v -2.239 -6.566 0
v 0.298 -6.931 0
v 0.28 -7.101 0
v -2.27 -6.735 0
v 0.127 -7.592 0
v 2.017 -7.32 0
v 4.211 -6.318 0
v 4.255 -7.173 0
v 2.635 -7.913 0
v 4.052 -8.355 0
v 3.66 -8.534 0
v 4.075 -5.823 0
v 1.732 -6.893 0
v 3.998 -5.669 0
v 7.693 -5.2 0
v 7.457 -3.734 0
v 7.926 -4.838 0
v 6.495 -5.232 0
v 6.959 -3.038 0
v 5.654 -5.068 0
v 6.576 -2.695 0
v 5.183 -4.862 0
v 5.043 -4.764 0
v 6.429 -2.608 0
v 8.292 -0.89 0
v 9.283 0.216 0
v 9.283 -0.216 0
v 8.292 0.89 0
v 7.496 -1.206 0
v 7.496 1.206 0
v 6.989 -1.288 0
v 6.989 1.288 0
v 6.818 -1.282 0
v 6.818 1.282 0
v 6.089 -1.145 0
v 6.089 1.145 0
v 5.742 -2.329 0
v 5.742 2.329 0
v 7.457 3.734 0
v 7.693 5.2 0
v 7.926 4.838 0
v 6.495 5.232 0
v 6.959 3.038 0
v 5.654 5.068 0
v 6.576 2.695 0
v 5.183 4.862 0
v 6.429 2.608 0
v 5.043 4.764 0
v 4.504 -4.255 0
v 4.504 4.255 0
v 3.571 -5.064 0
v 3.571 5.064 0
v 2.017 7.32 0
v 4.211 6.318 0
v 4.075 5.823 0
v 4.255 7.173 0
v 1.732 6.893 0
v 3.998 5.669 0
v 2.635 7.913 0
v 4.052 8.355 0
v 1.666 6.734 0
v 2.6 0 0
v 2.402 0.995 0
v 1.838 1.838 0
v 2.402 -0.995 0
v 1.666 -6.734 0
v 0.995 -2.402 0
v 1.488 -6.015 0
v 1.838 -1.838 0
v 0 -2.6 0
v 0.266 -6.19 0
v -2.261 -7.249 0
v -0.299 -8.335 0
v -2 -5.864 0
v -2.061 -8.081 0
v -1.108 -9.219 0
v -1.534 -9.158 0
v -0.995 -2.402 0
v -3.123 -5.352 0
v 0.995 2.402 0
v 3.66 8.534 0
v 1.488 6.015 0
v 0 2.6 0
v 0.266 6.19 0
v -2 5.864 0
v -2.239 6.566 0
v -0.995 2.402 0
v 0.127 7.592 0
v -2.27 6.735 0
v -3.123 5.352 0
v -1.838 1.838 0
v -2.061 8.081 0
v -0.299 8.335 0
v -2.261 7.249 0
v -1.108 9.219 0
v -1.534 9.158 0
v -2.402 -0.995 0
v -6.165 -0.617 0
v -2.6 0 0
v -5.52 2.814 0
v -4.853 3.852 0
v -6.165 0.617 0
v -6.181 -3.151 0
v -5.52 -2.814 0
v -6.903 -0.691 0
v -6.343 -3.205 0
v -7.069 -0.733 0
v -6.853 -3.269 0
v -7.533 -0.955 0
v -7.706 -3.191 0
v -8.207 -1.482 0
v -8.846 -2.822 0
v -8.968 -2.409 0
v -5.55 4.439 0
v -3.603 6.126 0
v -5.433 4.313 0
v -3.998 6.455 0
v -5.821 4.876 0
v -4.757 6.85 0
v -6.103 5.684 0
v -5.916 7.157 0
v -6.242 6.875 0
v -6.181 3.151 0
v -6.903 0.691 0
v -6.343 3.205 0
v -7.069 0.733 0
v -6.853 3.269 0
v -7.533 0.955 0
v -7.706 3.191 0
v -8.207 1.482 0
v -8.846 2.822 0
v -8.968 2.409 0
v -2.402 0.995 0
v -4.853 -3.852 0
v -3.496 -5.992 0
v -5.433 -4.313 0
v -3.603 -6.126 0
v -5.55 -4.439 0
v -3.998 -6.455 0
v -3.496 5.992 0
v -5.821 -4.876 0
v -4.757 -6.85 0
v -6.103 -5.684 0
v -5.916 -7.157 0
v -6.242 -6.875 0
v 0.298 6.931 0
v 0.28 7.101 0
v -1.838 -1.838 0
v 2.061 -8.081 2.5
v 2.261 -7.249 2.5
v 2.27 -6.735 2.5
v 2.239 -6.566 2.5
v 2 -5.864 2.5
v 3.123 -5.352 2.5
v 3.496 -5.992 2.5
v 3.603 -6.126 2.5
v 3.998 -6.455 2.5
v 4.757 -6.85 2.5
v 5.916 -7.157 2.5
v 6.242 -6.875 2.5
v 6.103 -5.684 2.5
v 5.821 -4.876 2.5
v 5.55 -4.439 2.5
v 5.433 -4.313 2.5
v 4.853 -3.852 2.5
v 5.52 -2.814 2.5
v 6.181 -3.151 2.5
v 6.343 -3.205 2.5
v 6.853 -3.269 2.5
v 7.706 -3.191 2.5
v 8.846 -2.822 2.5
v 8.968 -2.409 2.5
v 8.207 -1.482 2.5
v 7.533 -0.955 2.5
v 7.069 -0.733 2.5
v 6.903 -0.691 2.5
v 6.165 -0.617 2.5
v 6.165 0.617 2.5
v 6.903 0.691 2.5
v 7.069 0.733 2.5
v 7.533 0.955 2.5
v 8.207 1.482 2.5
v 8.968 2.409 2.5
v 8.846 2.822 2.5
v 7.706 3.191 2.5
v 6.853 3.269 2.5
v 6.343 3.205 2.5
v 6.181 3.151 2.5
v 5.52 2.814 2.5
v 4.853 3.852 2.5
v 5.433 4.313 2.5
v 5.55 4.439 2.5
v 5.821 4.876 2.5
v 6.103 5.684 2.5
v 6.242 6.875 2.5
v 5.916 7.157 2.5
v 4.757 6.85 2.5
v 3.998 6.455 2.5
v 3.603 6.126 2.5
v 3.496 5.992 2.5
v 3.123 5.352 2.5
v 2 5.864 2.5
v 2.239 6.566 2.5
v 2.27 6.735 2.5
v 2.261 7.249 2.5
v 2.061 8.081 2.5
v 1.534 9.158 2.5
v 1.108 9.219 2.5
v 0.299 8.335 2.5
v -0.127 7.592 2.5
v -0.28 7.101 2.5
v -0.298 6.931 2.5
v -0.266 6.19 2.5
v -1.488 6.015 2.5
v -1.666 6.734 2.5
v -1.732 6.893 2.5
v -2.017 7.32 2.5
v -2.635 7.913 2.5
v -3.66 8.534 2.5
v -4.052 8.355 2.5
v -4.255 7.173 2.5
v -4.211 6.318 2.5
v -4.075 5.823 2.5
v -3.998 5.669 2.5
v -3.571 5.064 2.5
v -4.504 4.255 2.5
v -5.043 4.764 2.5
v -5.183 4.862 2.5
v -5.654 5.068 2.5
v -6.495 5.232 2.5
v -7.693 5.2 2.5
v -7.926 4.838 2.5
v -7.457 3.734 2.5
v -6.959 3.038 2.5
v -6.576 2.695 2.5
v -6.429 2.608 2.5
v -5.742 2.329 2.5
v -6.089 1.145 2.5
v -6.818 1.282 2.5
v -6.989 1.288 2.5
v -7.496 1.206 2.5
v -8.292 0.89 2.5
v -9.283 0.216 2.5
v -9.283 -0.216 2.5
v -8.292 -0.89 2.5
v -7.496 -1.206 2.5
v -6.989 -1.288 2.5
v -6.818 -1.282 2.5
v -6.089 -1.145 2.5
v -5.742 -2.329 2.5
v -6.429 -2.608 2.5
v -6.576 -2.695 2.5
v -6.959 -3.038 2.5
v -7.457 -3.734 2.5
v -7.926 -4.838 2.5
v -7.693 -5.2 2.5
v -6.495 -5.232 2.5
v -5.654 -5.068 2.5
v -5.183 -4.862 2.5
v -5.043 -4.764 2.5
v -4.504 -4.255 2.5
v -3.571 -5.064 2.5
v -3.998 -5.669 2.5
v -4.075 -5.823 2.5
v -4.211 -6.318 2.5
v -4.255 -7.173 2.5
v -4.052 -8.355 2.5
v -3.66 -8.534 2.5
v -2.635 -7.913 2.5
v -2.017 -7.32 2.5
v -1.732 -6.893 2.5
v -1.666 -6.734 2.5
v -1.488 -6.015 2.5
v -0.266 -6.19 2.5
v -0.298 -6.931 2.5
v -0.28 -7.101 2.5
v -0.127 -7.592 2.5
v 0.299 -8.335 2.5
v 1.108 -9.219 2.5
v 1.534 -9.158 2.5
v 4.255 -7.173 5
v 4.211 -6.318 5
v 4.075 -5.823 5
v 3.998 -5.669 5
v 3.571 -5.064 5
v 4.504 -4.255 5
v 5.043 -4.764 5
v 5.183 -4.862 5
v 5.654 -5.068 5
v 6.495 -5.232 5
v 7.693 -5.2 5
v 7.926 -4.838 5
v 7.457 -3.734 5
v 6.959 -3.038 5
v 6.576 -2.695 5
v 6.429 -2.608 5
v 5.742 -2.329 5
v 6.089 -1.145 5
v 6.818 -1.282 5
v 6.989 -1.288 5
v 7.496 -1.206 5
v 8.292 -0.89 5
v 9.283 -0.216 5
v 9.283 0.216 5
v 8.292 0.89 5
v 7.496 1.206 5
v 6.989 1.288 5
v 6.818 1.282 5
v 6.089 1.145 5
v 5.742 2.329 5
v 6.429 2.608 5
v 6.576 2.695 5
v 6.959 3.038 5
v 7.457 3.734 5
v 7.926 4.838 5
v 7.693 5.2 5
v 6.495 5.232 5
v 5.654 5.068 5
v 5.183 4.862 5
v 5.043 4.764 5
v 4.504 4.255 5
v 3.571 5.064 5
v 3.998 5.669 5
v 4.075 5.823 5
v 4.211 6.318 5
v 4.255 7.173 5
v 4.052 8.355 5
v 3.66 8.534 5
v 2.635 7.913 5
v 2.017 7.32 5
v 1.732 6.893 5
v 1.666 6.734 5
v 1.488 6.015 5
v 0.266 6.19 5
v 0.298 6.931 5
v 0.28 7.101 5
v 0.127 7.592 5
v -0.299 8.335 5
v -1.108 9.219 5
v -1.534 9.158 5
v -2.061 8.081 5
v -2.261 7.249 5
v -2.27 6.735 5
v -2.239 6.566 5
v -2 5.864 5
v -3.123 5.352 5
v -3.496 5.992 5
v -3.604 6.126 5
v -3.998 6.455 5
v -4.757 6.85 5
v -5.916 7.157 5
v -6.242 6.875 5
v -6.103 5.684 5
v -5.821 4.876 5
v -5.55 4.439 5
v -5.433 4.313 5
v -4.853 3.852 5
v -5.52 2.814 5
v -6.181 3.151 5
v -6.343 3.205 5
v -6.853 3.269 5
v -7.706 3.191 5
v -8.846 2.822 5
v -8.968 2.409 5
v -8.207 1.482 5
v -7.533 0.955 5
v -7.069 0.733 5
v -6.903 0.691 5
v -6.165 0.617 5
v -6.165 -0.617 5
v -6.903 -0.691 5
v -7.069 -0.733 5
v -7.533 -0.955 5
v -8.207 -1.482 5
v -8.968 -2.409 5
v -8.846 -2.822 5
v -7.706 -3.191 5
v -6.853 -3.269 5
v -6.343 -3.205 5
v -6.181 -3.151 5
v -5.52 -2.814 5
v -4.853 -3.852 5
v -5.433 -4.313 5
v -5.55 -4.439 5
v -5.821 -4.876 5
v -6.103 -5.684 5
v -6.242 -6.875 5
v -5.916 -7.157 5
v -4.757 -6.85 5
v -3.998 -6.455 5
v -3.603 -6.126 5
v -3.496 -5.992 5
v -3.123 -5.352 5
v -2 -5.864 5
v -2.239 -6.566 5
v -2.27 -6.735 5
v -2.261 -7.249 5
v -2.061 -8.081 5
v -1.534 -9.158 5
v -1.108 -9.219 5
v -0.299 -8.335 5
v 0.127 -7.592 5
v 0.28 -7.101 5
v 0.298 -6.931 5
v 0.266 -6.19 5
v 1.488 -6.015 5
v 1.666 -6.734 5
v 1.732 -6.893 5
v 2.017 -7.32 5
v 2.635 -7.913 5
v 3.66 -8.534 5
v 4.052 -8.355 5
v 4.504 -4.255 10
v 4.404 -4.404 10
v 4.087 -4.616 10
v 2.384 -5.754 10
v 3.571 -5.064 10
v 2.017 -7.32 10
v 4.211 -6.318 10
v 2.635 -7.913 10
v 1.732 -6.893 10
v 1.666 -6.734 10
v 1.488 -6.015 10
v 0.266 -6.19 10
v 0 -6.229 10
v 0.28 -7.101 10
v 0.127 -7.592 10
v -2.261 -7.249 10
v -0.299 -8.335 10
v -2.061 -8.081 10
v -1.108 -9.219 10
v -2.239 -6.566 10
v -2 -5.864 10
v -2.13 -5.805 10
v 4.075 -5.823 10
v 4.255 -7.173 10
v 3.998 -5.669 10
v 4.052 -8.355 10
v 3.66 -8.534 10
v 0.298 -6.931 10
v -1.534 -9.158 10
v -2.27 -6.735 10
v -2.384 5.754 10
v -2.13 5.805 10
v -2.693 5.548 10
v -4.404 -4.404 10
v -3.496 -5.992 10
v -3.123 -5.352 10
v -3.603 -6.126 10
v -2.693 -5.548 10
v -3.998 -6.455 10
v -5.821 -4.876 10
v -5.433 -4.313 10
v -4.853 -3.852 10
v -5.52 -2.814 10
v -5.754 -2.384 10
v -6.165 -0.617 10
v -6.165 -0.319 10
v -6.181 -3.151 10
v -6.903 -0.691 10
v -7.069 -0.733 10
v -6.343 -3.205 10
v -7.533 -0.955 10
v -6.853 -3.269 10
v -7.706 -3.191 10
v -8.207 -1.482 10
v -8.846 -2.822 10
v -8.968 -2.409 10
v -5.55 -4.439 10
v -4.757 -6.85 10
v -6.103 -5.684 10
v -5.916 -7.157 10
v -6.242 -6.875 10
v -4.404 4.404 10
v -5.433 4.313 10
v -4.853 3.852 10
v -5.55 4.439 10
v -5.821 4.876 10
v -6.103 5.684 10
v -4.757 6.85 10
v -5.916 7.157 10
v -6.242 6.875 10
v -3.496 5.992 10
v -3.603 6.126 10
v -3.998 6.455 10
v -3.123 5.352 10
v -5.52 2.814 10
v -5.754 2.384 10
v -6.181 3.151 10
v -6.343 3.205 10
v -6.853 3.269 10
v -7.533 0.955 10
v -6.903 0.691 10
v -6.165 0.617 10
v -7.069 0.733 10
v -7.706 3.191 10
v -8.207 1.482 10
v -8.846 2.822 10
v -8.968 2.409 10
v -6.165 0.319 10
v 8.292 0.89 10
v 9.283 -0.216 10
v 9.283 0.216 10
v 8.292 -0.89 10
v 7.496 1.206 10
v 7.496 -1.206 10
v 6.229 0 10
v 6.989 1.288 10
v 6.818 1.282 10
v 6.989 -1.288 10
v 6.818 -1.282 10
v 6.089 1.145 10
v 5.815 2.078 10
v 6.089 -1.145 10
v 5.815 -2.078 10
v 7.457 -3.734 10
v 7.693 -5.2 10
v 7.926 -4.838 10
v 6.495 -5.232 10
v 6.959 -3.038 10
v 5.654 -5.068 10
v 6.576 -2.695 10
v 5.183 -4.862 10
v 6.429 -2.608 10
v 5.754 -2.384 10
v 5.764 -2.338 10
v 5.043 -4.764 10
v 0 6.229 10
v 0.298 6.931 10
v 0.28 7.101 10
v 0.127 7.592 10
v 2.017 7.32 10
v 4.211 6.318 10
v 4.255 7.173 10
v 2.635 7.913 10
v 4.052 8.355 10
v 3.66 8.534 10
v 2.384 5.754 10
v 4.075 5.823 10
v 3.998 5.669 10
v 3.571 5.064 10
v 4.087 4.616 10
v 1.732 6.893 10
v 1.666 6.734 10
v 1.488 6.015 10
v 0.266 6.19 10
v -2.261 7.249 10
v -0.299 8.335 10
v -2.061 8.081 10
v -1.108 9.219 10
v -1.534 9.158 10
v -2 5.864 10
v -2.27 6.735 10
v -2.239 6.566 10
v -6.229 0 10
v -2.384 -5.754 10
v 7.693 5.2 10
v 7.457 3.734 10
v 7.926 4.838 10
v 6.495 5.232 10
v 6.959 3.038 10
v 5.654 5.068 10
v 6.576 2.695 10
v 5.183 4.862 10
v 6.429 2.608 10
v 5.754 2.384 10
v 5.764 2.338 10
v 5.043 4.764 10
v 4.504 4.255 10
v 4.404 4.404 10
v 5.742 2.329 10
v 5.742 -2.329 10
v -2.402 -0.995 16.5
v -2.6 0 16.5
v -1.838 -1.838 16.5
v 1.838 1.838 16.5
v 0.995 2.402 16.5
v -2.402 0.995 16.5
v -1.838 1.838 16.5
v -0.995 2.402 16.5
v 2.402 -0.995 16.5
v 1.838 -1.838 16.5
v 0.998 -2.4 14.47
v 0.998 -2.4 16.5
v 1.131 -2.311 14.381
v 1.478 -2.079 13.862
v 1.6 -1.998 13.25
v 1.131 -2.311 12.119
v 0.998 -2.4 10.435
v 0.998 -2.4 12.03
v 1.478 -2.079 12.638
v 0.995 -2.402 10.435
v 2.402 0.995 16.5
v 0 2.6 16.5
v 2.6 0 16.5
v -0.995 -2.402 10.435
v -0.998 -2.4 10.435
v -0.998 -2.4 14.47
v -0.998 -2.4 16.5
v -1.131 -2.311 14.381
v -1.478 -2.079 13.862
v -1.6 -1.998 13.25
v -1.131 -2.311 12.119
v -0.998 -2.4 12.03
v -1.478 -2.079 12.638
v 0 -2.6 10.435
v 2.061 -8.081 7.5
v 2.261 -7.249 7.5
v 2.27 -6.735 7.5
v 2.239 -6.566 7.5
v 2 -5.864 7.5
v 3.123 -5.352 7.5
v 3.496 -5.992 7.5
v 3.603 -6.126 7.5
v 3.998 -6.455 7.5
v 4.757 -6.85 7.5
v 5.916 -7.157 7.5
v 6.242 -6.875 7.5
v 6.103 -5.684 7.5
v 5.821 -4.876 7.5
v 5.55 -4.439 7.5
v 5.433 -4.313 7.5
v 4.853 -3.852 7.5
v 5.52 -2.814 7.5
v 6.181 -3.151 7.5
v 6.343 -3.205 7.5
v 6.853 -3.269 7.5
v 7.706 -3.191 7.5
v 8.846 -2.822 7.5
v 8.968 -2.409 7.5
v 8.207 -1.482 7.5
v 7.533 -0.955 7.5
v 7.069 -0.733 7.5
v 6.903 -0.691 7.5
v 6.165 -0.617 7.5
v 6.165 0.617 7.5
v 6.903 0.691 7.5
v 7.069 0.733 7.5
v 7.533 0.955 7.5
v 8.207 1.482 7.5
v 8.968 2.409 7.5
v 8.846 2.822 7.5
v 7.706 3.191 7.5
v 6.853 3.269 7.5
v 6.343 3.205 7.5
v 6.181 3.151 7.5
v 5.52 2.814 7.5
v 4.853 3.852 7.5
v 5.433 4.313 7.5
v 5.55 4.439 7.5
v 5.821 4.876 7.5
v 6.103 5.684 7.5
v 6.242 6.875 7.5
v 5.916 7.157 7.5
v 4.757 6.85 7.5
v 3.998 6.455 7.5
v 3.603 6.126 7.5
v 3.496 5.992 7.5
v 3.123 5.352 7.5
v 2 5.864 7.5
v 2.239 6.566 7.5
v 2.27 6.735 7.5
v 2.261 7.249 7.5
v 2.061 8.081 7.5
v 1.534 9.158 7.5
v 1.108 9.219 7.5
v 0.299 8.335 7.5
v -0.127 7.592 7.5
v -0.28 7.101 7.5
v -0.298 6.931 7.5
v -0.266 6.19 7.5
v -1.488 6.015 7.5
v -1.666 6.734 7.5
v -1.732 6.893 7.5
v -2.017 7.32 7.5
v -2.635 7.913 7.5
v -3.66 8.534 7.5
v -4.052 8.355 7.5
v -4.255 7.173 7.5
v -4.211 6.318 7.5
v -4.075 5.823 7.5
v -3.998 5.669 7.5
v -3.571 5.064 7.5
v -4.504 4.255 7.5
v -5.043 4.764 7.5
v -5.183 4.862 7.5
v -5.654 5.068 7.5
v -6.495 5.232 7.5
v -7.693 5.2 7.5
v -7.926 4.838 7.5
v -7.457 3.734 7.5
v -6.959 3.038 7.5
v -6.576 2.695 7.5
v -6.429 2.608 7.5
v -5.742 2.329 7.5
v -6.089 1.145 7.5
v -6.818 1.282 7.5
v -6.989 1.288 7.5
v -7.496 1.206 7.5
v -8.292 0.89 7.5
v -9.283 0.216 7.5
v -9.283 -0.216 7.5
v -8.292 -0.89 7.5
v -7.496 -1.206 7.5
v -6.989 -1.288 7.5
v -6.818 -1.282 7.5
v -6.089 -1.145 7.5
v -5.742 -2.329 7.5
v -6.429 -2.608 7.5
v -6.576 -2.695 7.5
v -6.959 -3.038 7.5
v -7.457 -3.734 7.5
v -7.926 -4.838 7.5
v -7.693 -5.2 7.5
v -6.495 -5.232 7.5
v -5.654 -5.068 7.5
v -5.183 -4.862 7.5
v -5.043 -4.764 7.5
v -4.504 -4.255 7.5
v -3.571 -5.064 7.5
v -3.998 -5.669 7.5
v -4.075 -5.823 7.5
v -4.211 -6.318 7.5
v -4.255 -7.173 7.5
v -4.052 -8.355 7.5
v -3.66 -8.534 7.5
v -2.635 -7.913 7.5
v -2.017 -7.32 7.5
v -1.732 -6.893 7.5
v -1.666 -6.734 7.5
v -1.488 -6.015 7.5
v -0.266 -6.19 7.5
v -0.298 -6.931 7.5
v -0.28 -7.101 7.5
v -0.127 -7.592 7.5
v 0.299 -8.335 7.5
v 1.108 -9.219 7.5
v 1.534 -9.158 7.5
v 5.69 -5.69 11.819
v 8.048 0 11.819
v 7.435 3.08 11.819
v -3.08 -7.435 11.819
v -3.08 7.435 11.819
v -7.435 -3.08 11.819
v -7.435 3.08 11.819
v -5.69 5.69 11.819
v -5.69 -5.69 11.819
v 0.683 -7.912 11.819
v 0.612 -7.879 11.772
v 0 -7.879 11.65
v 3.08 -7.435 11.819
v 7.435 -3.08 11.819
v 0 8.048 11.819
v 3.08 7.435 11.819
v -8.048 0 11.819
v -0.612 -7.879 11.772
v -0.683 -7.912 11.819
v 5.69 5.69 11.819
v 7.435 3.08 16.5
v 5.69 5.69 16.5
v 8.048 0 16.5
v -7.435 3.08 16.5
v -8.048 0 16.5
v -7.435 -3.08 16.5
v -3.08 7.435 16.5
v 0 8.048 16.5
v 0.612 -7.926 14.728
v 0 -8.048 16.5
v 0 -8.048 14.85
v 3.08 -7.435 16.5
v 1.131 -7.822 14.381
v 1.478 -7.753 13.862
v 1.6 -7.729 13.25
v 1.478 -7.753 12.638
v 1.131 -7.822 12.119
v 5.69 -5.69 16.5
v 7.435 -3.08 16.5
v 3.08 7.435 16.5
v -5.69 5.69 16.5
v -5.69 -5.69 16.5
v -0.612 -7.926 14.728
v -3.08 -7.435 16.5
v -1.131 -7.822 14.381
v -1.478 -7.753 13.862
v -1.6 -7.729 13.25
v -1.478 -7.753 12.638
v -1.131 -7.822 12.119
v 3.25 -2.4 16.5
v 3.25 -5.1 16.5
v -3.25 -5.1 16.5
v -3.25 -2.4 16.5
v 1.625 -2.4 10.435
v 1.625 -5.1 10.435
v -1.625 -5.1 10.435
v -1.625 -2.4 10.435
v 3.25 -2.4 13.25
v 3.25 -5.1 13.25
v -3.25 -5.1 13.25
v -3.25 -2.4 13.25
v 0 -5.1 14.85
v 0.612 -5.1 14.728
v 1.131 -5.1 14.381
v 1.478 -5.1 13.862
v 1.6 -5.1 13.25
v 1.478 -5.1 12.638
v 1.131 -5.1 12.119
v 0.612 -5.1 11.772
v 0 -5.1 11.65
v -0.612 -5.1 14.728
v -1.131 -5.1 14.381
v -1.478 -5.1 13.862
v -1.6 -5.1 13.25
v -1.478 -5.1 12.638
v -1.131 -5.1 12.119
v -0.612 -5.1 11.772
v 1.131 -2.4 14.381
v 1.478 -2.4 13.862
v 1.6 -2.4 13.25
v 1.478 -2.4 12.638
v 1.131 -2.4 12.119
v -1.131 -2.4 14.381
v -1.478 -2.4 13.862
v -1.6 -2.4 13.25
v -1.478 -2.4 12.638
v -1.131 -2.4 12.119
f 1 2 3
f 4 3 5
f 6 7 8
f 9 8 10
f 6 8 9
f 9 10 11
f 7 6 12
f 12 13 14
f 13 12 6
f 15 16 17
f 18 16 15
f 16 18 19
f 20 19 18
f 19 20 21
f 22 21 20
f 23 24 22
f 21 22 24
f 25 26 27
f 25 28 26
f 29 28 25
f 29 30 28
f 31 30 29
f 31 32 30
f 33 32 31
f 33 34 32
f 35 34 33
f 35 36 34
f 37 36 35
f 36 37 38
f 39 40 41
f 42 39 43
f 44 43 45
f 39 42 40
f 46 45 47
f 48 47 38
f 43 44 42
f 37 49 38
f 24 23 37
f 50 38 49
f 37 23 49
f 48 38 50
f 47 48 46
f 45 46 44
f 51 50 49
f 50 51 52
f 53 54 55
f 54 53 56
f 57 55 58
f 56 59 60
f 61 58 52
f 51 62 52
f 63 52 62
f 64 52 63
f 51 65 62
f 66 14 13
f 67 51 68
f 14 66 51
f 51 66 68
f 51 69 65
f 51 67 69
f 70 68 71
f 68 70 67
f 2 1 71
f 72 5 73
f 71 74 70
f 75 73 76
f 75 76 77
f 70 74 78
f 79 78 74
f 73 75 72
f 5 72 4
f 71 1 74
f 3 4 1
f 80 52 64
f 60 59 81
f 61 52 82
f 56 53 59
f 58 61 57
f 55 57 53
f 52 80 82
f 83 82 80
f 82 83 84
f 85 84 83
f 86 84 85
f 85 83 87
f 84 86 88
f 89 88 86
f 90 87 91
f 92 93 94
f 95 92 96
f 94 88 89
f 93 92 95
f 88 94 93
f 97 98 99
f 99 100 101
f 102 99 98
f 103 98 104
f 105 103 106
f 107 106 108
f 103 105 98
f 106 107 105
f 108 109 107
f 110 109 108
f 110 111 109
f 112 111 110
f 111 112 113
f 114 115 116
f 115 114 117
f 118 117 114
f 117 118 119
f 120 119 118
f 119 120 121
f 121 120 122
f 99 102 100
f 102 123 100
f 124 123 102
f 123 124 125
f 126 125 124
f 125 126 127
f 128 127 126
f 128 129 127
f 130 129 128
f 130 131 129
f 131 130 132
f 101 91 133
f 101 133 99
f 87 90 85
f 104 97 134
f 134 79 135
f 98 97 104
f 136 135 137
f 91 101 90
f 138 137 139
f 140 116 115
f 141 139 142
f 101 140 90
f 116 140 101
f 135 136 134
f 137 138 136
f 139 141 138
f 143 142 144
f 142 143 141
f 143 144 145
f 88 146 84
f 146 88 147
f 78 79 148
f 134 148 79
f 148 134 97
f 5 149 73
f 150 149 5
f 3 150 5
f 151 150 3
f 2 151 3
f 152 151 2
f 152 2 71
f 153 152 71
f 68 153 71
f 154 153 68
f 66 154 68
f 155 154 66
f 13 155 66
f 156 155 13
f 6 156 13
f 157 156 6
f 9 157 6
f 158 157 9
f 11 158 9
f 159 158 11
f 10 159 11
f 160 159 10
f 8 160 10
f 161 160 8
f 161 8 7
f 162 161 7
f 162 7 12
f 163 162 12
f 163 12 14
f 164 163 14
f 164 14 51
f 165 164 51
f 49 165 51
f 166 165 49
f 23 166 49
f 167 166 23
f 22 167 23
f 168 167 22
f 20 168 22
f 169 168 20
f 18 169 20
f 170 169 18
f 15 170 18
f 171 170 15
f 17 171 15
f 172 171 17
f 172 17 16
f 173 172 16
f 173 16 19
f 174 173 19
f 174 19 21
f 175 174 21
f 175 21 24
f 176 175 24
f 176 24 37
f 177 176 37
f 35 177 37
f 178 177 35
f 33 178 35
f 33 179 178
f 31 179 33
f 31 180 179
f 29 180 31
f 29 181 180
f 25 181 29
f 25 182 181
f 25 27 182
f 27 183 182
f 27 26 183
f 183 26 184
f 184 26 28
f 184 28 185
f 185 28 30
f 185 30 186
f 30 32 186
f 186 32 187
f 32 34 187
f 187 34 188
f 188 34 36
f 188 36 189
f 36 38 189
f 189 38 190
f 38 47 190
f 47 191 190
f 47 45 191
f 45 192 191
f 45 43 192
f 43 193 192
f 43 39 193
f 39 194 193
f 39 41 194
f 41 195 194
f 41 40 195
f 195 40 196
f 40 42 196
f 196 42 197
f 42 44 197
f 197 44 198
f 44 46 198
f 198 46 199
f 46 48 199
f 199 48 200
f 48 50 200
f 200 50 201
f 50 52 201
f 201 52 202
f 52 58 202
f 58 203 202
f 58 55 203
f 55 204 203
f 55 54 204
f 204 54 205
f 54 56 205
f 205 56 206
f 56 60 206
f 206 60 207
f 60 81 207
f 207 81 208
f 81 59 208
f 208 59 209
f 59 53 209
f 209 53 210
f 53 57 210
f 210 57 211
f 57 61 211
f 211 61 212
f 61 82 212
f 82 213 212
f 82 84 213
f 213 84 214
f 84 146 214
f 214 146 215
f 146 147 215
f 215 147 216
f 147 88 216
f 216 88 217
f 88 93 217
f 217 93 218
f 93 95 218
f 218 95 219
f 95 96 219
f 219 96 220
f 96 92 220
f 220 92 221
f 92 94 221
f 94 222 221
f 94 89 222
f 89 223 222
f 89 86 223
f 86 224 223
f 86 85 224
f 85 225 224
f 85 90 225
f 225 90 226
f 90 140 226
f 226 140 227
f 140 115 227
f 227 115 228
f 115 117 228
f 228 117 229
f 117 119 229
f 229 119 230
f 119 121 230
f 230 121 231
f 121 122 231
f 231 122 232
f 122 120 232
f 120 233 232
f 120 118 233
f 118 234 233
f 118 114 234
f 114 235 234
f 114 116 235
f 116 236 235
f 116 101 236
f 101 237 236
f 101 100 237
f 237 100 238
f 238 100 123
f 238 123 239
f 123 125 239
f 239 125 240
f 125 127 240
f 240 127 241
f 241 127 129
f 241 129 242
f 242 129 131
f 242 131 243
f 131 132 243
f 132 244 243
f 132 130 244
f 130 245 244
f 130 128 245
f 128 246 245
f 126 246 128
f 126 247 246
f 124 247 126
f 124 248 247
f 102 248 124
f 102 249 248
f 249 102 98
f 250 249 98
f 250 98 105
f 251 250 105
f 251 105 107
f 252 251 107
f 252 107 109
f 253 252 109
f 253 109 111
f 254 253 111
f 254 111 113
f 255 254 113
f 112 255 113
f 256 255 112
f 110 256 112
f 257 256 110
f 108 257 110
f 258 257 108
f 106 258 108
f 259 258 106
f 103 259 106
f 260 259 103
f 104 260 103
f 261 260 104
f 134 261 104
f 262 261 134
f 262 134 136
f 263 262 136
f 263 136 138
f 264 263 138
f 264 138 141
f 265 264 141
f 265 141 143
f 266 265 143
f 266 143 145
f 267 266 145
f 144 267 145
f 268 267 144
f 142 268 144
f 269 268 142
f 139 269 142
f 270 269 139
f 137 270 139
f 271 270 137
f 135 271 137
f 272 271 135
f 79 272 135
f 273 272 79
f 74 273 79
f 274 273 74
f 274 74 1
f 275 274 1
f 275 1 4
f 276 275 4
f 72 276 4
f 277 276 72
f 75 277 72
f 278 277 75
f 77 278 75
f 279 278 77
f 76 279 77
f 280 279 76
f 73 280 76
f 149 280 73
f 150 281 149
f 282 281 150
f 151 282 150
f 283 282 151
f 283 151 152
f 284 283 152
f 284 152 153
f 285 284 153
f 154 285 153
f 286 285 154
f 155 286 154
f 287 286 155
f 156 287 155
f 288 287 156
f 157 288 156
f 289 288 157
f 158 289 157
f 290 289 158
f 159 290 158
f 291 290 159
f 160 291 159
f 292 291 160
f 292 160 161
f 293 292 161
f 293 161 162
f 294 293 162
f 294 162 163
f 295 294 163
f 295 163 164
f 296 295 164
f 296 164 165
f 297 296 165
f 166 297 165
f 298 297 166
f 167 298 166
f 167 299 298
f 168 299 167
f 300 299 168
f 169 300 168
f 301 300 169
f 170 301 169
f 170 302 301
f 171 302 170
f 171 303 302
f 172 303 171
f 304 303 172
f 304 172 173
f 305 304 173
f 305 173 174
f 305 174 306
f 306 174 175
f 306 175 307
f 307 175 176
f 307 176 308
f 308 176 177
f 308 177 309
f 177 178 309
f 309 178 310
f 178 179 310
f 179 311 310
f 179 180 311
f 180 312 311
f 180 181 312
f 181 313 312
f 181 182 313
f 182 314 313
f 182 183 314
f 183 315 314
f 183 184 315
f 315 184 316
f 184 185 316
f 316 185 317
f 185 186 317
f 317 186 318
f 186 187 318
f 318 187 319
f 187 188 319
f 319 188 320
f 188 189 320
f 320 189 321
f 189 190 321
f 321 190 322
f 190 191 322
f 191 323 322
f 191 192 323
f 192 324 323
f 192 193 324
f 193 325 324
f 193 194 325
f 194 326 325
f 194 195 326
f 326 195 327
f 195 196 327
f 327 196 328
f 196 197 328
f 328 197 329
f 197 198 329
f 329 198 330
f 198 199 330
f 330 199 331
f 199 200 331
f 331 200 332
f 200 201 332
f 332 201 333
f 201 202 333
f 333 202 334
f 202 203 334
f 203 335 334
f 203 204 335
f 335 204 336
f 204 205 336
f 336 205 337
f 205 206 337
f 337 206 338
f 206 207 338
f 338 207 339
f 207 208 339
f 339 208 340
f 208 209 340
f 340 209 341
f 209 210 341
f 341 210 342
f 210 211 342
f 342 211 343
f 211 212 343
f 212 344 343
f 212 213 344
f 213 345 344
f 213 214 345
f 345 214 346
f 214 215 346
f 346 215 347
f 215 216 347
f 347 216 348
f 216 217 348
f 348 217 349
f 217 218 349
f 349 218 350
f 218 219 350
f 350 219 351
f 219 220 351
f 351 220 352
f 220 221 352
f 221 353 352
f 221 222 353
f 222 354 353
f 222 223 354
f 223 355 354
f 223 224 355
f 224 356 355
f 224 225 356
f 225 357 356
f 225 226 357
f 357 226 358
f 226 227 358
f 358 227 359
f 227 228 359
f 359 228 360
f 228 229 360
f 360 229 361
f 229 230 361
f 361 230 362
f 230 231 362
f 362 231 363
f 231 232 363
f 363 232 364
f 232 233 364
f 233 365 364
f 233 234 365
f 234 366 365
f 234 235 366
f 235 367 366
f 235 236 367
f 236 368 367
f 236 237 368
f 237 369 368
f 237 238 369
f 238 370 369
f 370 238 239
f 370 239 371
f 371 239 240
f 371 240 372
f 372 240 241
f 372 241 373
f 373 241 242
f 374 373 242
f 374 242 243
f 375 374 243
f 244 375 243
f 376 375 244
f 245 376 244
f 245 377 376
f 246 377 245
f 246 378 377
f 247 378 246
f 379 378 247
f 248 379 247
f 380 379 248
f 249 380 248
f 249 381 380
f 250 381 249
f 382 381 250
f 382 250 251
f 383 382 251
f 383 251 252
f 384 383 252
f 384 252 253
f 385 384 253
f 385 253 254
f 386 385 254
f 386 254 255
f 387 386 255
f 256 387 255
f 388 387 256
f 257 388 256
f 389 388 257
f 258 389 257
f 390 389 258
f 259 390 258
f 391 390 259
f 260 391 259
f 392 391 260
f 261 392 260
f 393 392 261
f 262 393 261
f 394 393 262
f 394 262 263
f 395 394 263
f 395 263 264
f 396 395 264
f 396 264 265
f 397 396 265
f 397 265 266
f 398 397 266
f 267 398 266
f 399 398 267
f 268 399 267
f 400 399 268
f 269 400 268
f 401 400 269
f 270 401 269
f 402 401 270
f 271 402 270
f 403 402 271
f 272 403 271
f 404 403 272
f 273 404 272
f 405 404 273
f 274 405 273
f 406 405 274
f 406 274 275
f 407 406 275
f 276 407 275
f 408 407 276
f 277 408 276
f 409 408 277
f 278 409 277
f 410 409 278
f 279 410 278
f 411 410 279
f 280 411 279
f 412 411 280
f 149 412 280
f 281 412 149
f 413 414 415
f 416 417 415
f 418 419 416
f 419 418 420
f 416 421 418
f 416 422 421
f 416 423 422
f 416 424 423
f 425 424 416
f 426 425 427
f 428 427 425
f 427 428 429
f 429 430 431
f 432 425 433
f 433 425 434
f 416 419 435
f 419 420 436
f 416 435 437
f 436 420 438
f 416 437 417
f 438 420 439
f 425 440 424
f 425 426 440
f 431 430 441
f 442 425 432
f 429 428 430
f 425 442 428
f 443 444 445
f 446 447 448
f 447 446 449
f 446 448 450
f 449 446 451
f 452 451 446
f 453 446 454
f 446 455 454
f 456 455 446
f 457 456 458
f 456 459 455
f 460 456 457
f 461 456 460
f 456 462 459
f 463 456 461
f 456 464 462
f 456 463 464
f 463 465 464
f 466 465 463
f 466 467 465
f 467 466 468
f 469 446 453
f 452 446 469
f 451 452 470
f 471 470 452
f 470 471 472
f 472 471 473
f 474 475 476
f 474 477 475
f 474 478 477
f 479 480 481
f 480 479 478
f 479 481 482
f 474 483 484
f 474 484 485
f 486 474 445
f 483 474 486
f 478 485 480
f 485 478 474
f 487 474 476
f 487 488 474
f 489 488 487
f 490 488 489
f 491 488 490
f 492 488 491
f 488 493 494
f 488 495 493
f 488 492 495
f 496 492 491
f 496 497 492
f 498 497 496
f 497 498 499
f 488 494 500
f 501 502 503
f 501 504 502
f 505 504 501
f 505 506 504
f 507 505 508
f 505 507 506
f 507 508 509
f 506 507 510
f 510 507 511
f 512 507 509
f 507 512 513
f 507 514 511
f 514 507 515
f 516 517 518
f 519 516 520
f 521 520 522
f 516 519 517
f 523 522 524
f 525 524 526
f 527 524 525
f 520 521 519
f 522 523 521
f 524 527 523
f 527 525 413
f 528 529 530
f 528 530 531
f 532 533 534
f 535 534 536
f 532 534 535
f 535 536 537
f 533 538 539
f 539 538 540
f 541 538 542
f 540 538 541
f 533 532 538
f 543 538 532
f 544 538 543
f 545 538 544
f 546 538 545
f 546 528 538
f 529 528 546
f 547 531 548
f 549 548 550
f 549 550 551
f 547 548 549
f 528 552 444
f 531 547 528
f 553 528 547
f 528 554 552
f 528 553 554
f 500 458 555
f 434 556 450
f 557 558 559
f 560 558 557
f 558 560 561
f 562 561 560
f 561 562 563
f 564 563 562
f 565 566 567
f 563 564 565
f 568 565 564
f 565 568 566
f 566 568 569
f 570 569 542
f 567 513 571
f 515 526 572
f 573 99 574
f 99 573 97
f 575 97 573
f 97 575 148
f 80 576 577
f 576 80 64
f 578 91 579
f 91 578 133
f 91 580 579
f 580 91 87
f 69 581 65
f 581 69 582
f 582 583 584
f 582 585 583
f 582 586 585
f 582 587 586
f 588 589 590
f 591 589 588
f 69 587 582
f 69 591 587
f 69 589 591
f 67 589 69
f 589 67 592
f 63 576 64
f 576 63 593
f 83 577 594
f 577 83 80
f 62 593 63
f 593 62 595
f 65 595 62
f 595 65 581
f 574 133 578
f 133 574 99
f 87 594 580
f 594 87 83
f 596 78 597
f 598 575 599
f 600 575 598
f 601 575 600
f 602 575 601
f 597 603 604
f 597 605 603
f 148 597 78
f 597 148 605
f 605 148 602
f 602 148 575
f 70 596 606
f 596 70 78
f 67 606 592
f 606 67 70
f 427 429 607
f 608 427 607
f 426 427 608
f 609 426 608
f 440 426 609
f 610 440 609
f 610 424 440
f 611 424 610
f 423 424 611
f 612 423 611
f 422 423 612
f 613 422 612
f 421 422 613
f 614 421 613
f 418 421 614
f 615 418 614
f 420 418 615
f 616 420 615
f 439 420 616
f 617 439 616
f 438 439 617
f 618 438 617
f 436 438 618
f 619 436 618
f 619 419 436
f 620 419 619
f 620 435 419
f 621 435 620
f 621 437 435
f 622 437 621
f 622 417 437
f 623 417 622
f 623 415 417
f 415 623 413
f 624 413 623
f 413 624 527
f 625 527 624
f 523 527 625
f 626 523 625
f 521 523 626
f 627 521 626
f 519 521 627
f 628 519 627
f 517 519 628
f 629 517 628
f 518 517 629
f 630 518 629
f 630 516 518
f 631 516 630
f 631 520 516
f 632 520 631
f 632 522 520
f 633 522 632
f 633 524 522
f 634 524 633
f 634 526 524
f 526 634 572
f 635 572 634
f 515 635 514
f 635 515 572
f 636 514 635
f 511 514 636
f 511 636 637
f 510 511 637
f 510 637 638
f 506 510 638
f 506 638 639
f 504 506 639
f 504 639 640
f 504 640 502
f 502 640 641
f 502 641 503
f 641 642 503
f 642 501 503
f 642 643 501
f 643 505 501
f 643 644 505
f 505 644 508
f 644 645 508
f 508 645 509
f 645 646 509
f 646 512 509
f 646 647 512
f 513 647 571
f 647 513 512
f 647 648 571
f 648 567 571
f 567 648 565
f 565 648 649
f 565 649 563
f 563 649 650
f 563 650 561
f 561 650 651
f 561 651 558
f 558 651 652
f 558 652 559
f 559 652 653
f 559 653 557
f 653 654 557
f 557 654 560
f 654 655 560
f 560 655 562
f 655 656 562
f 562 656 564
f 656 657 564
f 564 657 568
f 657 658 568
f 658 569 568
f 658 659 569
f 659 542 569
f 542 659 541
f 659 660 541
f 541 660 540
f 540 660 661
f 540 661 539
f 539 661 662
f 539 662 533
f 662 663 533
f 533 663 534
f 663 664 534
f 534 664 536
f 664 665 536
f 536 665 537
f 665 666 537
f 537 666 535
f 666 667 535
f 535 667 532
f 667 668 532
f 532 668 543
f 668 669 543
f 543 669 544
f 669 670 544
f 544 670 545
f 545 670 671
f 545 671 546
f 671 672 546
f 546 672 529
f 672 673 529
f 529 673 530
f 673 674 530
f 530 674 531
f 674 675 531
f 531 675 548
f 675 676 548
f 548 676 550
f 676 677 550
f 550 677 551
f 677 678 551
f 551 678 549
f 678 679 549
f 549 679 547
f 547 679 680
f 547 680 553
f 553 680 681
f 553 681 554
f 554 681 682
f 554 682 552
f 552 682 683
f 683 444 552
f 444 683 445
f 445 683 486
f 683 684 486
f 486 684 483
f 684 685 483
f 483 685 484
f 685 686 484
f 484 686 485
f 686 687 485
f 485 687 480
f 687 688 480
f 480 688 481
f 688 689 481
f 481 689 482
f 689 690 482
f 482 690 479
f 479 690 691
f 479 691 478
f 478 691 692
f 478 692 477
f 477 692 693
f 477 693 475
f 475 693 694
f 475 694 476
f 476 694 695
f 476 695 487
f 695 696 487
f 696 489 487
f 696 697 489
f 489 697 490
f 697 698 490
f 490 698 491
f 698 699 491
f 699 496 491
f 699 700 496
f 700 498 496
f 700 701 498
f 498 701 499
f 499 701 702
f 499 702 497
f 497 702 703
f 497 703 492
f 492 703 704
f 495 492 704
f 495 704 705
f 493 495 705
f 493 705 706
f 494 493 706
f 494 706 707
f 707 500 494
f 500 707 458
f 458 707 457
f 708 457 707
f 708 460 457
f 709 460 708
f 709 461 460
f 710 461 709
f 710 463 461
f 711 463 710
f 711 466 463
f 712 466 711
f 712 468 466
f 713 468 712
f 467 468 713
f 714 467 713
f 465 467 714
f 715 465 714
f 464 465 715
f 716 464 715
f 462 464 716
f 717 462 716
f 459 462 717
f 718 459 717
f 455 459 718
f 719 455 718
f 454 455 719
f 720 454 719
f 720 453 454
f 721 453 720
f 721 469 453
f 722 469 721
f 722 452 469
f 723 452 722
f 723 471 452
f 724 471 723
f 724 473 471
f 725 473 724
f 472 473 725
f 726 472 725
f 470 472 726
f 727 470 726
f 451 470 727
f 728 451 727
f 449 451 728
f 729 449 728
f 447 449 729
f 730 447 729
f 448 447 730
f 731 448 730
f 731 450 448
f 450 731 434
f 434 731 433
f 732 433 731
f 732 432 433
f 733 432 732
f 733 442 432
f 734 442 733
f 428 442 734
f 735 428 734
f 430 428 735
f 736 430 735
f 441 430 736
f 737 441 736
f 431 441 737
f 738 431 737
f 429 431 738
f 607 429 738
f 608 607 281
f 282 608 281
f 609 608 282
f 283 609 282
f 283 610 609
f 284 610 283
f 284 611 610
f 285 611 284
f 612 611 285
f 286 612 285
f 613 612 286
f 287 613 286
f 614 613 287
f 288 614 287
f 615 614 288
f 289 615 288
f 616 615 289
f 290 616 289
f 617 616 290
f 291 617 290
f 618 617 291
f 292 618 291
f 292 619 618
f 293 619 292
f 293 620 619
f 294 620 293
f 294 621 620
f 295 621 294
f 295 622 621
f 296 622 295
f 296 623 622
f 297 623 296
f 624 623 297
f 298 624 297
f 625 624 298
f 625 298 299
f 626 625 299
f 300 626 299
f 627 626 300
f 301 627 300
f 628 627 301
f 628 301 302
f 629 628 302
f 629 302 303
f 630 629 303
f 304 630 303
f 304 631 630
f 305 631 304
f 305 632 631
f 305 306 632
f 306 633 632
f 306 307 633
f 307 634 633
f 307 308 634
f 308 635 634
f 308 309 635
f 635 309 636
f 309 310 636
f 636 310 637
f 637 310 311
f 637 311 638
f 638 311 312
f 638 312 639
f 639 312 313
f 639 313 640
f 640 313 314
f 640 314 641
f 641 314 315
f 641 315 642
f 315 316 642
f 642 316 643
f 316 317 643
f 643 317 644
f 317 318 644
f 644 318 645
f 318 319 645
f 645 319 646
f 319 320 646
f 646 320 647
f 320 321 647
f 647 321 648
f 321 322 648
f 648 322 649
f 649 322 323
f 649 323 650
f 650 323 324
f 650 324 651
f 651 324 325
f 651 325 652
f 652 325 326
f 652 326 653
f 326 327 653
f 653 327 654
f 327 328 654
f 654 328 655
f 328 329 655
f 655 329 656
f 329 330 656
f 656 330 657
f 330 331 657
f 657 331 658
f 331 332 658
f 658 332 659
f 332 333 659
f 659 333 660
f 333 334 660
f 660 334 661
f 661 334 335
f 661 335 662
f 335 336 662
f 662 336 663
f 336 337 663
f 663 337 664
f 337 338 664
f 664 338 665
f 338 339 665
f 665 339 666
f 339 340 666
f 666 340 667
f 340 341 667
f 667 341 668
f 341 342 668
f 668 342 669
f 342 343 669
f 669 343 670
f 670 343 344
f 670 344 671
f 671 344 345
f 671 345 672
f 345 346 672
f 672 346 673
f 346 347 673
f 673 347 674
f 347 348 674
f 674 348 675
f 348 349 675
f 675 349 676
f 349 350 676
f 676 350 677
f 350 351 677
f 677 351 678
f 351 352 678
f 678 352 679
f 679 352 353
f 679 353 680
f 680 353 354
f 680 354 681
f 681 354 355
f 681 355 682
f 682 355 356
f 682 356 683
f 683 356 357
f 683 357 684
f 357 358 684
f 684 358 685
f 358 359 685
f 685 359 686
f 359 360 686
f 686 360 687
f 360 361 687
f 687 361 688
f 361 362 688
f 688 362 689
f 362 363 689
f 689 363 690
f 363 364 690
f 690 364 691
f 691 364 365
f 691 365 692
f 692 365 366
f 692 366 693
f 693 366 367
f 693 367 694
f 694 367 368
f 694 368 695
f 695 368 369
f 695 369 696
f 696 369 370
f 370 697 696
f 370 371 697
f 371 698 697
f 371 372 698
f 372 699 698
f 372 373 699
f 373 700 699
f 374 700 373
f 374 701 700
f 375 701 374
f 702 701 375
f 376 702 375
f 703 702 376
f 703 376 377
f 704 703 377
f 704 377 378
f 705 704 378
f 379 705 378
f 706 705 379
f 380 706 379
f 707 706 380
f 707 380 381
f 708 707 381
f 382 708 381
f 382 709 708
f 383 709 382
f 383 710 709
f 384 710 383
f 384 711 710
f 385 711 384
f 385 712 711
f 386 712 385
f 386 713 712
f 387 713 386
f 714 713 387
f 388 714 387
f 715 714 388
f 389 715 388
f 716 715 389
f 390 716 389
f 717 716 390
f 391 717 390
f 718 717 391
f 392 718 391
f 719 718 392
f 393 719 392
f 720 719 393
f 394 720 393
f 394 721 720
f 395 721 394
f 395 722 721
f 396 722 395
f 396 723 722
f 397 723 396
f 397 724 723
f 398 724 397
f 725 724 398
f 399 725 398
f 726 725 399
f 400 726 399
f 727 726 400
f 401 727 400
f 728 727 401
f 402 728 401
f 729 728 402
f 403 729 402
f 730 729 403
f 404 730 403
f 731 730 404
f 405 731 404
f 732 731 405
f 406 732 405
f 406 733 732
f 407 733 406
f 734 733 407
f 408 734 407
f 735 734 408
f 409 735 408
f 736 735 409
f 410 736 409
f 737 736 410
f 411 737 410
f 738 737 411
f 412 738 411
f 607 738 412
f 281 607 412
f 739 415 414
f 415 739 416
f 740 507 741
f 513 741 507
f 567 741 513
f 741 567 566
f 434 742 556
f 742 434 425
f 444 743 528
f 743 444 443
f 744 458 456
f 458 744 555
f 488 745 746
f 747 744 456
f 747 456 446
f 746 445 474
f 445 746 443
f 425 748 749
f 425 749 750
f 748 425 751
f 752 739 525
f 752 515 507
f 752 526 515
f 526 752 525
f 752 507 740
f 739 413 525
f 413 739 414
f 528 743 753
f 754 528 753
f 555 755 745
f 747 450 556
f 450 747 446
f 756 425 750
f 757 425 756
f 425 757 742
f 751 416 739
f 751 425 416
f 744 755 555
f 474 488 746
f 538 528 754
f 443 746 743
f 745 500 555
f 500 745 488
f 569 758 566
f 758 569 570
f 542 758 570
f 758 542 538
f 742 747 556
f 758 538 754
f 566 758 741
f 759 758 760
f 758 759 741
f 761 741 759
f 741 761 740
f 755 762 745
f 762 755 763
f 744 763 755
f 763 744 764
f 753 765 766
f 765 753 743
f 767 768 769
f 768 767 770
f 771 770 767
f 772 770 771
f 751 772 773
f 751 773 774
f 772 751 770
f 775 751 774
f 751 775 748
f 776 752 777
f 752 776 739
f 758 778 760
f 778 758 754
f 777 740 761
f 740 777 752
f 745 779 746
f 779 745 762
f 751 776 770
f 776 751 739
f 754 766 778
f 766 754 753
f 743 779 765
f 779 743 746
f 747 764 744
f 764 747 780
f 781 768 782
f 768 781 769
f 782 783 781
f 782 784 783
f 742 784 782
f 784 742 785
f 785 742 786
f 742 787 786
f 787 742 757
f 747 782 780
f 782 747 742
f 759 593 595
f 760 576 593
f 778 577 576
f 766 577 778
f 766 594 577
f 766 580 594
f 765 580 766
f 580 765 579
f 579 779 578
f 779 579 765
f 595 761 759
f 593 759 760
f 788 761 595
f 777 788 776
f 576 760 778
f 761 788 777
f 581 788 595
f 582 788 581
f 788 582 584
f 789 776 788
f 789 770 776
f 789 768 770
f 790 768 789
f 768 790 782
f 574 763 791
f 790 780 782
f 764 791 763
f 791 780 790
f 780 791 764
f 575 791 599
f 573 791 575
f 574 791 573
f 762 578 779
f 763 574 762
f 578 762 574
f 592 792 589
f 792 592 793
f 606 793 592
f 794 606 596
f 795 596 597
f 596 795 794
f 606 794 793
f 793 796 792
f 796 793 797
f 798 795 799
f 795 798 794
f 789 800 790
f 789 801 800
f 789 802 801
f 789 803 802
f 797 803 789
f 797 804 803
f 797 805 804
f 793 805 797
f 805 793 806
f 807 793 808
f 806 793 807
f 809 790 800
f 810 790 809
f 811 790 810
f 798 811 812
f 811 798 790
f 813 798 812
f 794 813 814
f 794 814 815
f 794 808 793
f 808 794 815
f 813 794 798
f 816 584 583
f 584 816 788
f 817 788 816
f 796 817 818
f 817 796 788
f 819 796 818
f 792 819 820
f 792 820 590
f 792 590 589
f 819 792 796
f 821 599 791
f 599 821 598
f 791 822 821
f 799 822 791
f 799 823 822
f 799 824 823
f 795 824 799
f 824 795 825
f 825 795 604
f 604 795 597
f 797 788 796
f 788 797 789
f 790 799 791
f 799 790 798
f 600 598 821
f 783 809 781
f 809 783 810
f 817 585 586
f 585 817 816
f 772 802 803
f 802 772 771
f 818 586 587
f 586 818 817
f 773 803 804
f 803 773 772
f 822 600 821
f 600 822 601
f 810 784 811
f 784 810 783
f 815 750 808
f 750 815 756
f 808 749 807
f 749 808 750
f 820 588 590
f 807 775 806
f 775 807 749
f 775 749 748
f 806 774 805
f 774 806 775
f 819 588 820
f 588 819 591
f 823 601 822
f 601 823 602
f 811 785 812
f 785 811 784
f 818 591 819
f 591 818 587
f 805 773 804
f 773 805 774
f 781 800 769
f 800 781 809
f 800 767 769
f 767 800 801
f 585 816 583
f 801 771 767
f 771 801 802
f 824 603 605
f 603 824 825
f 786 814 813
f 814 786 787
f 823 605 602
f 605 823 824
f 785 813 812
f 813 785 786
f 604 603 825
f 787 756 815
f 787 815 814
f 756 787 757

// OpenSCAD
/*
 * extruder gears
 *
 * Simple double helix gears for extruders
 *
 * Copyright 2012 <b@Zi.iS>
 * License CC BY 3.0
 */
$fn = 16; //preview
//$fn = 60; //render

use <MCAD/involute_gears.scad>

m3 = [
	3.2 /2, //bolt radius
	6.5/2, //nut radius
	2.5 //nut height
];
m8 = [
	8.5 / 2, //bolt radius
	15 /2 //nut radius
];
motor_shaft = 5.2/2;

gear_set();

module gear_set(
	height = 10,
	teath = [11, 45],
	pitch = 40,
	thickness = 2,
	shafts = [motor_shaft, m8],
	bolts = [m3,]
) {	
	setscrew_space = pow(pow(shafts[0] + bolts[0][2], 2) +  pow(bolts[0][1], 2), .5);
	e = .2;

	//We calculate the small gear's root_radius to ensure we use a printable overhang to make room for the setscrew
	root_radius = pitch * teath[0] / (teath[0] + teath[1]) - 2 * pitch * teath[0] / ((teath[0] + teath[1]) * teath[0]) - .2;
	overhang_height = setscrew_space + thickness - root_radius;

	//Small gear
	union() {	
		double_helix_gear(
			teath[0],
			teath[1],
			pitch,
			height,
			thickness,
			-360,
			shafts[0],
			2 // aprox. inside of rim
		);
		difference() {
			union() {
				translate([
					0,
					0,
					height
				]) {	
					cylinder(
						h = overhang_height,
						r1 = root_radius,
						r2 = setscrew_space + thickness
					);
				}
				translate([
					0,
					0,
					height + overhang_height
				]) {
					cylinder(
						h = bolts[0][1]*2 - overhang_height,
						r = setscrew_space + thickness
					);
				}
			}

			//motor shaft
			cylinder(
				r = shafts[0],
				h = 100
			);

			//setscrew
			translate([
				0,
				0,
				height + bolts[0][1]
			]) {
				rotate([
					90,
					0,
					0,
				]) {
					cylinder(
						r = bolts[0][0],
						h = 100
					);
					translate([
						0,
						0,
						shafts[0] - e
					]) {
						cylinder(
							r = bolts[0][1],
							h = bolts[0][2] + e,
							$fn = 6
						);
						translate([
							-bolts[0][1],
							0,
							0,
						]) {
							cube([
								bolts[0][1]*2,
								100,
								bolts[0][2] + e
							]);
						}
					}
				}
			}
		}
	}
	
	//Large gear
	%translate([
		pitch + 10,
		0,
		0
	]) {
		difference() {
			double_helix_gear(
				teath[1],
				teath[0],
				pitch,
				height,
				thickness,
				-360,
				shafts[1][0],
				shafts[1][1] + thickness
			);
			//Mounts over hex-bolt head
			translate([
				0,
				0,
				thickness * 2
			]) {
				cylinder(
					r = shafts[1][1],
					h = 100,
					$fn = 6
				);
			}
		}
	}
}


module double_helix_gear(
	number_of_teeth,
	partner_number_of_teeth,
	partner_pitch,
	height,
	thickness,
	twist,
	shaft,
	hub_thickness
) {
	circular_pitch = 360 * partner_pitch / (number_of_teeth + partner_number_of_teeth);
	union() {
		gear(
			twist = twist / number_of_teeth, 
			number_of_teeth = number_of_teeth, 
			circular_pitch = circular_pitch, 
			gear_thickness = thickness, 
			rim_thickness = height/2, 
			rim_width = thickness,
			hub_diameter=shaft*2 + hub_thickness*2,
			hub_thickness = height, 
			bore_diameter = shaft*2,
			circles = 7
		);
		translate([
			0,
			0,
			height
		]) {
			mirror([
				0,
				0,
				1
			]) {
				gear(
					twist = twist / number_of_teeth, 
					number_of_teeth = number_of_teeth, 
					circular_pitch = circular_pitch, 
					gear_thickness = 0, 
					rim_thickness = height/2, 
					rim_width = thickness,
					hub_thickness = 0, 
					hub_width = 0,
					bore_diameter = 0
				);
			}
		}
	}
}
